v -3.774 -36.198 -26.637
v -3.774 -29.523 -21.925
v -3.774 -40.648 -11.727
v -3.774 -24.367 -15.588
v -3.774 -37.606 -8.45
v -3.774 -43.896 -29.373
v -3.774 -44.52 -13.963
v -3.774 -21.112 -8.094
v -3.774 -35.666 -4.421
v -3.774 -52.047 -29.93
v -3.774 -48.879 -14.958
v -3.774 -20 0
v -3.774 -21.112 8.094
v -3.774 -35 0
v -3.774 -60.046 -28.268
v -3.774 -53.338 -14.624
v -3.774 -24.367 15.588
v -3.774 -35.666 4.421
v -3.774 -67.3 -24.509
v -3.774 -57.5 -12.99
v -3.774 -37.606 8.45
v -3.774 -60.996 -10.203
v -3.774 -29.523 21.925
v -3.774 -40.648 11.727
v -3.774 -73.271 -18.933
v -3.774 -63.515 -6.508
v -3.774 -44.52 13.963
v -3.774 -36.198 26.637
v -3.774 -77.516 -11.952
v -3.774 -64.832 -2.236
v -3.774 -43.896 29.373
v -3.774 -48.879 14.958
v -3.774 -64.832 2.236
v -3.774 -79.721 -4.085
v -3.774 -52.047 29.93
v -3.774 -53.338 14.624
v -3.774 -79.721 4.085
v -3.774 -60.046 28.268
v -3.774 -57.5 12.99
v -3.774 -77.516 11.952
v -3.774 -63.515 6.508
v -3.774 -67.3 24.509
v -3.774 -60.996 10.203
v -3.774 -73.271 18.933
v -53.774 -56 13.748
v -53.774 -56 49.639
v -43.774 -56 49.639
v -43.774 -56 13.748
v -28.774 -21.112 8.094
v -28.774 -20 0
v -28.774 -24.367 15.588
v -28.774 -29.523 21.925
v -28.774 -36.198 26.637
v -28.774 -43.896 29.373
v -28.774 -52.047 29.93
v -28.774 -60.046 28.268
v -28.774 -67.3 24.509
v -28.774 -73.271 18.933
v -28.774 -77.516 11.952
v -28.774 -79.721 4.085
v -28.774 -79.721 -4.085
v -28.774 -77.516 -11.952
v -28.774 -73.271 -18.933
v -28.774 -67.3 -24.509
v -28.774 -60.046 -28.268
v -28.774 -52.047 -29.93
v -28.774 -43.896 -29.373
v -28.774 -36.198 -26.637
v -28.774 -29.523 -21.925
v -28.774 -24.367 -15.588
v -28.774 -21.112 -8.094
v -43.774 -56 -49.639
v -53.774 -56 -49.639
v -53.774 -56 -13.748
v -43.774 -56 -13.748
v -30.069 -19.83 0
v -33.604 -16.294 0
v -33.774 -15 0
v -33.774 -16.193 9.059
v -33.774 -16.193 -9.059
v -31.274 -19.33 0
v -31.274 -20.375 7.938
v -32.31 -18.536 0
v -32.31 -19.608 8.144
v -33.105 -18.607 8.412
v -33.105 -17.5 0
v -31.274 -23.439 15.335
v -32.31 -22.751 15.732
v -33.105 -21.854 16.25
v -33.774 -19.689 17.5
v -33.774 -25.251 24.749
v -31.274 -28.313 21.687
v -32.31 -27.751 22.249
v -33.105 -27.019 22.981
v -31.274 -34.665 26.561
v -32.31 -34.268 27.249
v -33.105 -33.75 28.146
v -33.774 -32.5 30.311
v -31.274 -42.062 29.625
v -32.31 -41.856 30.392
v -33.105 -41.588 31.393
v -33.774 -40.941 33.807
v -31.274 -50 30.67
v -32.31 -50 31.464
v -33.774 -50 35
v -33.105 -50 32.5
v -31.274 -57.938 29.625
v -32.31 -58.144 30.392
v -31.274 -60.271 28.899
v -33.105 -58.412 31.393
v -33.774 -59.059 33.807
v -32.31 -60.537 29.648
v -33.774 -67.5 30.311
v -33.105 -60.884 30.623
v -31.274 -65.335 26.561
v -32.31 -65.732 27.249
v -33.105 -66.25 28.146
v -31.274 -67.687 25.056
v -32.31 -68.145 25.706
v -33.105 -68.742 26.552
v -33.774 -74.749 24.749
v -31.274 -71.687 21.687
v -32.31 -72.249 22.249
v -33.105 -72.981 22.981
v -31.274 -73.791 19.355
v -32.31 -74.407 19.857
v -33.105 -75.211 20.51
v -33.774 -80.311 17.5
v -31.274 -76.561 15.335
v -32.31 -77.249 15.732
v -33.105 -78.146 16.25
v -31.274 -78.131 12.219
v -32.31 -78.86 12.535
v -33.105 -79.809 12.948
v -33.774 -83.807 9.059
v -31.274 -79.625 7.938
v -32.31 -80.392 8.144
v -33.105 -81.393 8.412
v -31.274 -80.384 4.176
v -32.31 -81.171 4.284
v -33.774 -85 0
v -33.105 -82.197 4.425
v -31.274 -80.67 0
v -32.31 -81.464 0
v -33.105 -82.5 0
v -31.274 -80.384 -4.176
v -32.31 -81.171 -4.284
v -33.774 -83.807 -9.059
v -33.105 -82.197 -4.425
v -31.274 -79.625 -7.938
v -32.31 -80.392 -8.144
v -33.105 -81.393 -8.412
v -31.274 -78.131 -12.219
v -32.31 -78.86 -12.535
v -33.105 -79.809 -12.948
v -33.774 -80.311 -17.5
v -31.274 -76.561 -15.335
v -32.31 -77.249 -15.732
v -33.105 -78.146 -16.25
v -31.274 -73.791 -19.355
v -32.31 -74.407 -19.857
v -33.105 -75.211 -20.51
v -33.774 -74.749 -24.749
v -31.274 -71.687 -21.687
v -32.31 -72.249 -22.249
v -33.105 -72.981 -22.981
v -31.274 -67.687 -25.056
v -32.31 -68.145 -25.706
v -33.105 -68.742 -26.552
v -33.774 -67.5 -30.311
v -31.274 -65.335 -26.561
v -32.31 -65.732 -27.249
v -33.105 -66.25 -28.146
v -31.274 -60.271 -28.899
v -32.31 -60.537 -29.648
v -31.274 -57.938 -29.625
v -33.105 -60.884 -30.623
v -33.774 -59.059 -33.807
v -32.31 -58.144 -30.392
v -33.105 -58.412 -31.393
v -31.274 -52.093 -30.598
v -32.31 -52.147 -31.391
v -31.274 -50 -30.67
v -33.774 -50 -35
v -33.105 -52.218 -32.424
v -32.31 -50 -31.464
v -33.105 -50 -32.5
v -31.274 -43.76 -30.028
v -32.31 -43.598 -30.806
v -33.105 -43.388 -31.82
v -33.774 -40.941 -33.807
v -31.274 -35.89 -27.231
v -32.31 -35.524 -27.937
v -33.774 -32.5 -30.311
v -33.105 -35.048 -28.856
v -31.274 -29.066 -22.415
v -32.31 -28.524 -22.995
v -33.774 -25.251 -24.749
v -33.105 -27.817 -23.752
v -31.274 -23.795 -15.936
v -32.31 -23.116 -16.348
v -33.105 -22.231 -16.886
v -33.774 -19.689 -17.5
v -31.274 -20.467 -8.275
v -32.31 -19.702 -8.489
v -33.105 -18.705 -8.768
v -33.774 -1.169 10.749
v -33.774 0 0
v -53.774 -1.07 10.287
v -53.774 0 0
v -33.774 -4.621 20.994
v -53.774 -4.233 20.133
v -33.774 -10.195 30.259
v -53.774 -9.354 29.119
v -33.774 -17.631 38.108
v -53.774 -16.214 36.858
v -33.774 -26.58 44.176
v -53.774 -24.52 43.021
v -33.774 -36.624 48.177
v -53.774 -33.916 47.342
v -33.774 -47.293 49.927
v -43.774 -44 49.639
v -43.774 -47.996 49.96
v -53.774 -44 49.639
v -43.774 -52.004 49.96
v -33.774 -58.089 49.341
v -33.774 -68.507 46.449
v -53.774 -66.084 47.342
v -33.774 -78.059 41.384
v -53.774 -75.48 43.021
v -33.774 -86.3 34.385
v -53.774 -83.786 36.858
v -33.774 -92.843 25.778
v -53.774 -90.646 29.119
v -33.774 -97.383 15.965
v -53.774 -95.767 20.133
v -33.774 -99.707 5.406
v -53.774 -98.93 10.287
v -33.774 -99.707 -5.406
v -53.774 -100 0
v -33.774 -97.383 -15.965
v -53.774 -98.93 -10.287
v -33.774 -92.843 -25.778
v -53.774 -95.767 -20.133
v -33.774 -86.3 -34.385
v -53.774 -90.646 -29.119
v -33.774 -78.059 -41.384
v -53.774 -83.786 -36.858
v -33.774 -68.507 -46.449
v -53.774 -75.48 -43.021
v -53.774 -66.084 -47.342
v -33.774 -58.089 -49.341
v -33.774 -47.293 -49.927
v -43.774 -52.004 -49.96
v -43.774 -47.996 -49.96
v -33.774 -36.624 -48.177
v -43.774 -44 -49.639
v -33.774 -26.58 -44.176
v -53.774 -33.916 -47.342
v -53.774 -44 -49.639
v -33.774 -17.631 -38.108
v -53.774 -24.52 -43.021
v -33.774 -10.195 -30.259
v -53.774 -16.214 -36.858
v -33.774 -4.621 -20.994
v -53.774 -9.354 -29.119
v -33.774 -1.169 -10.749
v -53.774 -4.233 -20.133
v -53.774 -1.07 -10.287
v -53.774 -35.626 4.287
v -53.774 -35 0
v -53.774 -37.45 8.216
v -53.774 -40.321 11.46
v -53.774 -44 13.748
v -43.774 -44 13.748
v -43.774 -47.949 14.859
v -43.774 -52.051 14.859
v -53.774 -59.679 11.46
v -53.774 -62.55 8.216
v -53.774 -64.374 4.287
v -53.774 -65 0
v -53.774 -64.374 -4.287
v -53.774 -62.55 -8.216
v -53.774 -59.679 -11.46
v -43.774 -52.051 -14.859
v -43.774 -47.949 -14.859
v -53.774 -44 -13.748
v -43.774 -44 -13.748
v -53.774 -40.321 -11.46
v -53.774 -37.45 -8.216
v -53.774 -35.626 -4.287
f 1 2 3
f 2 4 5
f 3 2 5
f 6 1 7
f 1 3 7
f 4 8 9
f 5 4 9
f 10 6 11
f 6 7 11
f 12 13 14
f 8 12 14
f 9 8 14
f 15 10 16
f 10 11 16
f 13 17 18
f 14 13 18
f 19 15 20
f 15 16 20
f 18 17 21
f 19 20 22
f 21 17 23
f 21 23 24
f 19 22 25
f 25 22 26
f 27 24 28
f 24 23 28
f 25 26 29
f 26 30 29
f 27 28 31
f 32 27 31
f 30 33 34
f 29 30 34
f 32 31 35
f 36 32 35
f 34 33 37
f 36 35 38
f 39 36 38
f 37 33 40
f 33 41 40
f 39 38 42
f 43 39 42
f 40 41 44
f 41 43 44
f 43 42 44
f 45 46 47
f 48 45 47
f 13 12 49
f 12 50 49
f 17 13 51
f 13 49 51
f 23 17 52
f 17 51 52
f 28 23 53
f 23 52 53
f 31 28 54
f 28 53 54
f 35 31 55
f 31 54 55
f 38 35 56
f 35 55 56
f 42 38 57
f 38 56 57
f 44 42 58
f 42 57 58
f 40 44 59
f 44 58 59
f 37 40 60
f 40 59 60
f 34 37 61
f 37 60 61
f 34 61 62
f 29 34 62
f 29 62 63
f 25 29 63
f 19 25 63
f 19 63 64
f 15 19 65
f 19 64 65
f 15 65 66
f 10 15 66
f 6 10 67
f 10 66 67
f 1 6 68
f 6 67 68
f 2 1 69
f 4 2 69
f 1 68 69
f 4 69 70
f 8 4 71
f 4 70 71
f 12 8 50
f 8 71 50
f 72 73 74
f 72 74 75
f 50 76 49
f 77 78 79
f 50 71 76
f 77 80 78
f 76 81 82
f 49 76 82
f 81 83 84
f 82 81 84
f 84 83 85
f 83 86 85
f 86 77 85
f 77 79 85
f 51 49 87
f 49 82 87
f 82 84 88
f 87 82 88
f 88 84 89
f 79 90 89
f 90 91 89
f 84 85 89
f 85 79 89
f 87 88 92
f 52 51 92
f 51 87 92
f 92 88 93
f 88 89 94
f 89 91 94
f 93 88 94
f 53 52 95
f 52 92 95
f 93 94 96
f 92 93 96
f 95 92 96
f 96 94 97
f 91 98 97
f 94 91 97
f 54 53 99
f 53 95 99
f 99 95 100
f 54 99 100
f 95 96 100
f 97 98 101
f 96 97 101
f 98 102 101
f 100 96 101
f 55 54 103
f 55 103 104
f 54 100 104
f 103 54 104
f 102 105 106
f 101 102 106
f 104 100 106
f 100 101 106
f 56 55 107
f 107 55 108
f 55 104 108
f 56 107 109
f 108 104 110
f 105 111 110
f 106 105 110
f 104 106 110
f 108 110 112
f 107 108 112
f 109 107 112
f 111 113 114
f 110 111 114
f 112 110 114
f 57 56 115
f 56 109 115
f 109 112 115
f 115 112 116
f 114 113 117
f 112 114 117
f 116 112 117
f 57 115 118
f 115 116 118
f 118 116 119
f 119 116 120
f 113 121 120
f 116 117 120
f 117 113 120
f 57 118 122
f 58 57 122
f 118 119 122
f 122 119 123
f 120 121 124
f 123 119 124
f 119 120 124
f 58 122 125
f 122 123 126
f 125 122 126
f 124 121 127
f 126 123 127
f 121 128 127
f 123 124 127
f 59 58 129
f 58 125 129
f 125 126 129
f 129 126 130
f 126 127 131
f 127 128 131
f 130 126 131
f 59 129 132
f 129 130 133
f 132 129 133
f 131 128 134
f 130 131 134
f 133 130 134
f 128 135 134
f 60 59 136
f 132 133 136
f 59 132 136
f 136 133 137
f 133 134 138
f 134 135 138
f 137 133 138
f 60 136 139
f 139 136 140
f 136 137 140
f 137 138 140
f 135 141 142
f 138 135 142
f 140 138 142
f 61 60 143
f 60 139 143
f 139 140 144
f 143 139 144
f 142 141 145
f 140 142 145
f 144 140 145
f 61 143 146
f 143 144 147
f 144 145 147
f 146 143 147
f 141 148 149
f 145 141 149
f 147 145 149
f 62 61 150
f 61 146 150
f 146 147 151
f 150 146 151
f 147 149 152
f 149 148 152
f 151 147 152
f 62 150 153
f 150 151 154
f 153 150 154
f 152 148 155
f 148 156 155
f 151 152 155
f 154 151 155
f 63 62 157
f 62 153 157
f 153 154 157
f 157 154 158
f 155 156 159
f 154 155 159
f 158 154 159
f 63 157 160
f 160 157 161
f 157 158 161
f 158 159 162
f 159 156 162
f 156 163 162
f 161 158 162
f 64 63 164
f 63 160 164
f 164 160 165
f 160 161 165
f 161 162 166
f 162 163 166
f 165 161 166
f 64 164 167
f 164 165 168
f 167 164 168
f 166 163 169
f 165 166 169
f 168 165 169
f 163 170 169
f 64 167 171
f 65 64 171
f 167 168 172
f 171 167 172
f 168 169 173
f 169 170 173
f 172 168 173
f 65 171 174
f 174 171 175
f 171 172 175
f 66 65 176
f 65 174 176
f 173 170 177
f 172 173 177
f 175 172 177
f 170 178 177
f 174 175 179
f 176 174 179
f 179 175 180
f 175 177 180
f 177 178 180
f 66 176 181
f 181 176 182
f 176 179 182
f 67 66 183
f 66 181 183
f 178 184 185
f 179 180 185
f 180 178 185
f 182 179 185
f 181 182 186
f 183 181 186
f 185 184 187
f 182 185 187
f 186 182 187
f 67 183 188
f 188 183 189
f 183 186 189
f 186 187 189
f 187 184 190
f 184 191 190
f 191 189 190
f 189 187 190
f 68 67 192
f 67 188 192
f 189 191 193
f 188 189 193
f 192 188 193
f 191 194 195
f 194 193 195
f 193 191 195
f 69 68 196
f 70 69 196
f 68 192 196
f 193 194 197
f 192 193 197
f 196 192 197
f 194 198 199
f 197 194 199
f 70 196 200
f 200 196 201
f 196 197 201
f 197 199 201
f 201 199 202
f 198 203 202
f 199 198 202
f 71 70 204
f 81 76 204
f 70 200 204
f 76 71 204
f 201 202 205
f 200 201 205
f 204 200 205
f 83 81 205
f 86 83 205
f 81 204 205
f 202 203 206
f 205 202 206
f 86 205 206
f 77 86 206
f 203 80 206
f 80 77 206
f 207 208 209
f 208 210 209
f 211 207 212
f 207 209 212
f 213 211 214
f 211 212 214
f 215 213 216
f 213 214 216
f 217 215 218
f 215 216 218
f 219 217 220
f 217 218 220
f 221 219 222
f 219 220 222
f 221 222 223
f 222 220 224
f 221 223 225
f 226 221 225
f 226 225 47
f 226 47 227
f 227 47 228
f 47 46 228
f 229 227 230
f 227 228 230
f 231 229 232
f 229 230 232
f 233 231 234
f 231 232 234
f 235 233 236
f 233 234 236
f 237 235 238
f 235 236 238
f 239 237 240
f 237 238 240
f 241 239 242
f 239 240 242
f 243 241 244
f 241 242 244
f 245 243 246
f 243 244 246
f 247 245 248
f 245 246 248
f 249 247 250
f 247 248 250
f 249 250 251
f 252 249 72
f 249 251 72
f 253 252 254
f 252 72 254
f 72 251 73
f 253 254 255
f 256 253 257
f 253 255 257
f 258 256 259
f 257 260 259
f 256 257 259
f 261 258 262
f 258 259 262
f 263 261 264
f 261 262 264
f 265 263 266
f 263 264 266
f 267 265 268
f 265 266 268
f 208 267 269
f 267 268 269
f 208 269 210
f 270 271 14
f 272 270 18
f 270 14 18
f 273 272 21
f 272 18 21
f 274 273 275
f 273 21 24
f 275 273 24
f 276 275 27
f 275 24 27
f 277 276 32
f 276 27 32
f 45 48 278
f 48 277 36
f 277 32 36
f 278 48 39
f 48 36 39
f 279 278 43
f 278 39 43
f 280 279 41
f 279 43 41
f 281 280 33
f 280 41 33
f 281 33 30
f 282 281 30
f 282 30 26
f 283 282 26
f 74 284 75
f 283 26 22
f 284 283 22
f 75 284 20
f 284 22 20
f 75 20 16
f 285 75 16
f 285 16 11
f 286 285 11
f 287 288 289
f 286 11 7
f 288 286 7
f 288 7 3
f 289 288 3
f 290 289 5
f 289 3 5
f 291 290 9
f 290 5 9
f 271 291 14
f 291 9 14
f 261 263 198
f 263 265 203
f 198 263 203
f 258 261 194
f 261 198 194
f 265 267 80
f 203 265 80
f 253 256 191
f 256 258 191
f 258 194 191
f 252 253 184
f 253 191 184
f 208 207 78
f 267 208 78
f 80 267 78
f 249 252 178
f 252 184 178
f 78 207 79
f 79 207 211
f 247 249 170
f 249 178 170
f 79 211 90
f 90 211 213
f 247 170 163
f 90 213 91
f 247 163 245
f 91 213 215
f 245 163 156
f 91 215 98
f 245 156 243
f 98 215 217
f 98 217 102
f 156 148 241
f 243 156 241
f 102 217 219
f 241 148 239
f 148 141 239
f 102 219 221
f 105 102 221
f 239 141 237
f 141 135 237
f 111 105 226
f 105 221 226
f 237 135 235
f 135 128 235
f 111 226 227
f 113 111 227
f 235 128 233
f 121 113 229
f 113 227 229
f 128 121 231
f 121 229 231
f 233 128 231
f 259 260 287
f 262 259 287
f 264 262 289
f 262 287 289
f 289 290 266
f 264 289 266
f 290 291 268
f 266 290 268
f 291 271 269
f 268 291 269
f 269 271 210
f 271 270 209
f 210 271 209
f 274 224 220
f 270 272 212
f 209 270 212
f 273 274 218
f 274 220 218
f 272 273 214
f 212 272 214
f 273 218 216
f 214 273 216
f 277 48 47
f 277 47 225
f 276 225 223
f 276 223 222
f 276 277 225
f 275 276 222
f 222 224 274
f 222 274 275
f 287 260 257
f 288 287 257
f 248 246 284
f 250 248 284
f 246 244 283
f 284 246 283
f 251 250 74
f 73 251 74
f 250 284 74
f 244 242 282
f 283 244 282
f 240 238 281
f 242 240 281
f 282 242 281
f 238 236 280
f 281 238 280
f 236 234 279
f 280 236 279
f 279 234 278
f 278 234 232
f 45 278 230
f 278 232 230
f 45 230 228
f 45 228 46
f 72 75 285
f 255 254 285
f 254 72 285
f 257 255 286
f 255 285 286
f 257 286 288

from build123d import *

# Parameters (mm, degrees)
F0_W          = 10
F0_H          = 6
F2_DEPTH      = 50.001
F2_DEPTH_BACK = 50.001


with BuildPart() as f1:
    # F0 (on Top) → F1 (revolve)
    with BuildSketch(Plane.XY):
        with BuildLine():
            Line((-33.7744166376, 0), (-53.7744166376, 0))
            Line((-53.7744166376, 0), (-53.7744166376, -35))
            Line((-53.7744166376, -35), (-3.7744166376, -35))
            Line((-3.7744166376, -35), (-3.7744166376, -20))
            Line((-3.7744166376, -20), (-28.7744166376, -20))
            ThreePointArc((-28.7744166376, -20), (-32.3099505436, -18.5355339059), (-33.7744166376, -15))
            Line((-33.7744166376, -15), (-33.7744166376, 0))
        make_face()
    revolve(axis=Axis((-3.7744166376, -50, 0), (1, 0, 0)))

    # F0 (on Top) → F2 (cut, two sides)
    with BuildSketch(Plane.XY) as f2_sk:
        with Locations((-48.7744166376, -53)):
            Rectangle(F0_W, F0_H)
        with Locations((-48.7744166376, -47)):
            Rectangle(F0_W, F0_H)
    extrude(amount=-F2_DEPTH, mode=Mode.SUBTRACT)
    extrude(f2_sk.sketch, amount=F2_DEPTH_BACK, mode=Mode.SUBTRACT)


solid = f1.part
